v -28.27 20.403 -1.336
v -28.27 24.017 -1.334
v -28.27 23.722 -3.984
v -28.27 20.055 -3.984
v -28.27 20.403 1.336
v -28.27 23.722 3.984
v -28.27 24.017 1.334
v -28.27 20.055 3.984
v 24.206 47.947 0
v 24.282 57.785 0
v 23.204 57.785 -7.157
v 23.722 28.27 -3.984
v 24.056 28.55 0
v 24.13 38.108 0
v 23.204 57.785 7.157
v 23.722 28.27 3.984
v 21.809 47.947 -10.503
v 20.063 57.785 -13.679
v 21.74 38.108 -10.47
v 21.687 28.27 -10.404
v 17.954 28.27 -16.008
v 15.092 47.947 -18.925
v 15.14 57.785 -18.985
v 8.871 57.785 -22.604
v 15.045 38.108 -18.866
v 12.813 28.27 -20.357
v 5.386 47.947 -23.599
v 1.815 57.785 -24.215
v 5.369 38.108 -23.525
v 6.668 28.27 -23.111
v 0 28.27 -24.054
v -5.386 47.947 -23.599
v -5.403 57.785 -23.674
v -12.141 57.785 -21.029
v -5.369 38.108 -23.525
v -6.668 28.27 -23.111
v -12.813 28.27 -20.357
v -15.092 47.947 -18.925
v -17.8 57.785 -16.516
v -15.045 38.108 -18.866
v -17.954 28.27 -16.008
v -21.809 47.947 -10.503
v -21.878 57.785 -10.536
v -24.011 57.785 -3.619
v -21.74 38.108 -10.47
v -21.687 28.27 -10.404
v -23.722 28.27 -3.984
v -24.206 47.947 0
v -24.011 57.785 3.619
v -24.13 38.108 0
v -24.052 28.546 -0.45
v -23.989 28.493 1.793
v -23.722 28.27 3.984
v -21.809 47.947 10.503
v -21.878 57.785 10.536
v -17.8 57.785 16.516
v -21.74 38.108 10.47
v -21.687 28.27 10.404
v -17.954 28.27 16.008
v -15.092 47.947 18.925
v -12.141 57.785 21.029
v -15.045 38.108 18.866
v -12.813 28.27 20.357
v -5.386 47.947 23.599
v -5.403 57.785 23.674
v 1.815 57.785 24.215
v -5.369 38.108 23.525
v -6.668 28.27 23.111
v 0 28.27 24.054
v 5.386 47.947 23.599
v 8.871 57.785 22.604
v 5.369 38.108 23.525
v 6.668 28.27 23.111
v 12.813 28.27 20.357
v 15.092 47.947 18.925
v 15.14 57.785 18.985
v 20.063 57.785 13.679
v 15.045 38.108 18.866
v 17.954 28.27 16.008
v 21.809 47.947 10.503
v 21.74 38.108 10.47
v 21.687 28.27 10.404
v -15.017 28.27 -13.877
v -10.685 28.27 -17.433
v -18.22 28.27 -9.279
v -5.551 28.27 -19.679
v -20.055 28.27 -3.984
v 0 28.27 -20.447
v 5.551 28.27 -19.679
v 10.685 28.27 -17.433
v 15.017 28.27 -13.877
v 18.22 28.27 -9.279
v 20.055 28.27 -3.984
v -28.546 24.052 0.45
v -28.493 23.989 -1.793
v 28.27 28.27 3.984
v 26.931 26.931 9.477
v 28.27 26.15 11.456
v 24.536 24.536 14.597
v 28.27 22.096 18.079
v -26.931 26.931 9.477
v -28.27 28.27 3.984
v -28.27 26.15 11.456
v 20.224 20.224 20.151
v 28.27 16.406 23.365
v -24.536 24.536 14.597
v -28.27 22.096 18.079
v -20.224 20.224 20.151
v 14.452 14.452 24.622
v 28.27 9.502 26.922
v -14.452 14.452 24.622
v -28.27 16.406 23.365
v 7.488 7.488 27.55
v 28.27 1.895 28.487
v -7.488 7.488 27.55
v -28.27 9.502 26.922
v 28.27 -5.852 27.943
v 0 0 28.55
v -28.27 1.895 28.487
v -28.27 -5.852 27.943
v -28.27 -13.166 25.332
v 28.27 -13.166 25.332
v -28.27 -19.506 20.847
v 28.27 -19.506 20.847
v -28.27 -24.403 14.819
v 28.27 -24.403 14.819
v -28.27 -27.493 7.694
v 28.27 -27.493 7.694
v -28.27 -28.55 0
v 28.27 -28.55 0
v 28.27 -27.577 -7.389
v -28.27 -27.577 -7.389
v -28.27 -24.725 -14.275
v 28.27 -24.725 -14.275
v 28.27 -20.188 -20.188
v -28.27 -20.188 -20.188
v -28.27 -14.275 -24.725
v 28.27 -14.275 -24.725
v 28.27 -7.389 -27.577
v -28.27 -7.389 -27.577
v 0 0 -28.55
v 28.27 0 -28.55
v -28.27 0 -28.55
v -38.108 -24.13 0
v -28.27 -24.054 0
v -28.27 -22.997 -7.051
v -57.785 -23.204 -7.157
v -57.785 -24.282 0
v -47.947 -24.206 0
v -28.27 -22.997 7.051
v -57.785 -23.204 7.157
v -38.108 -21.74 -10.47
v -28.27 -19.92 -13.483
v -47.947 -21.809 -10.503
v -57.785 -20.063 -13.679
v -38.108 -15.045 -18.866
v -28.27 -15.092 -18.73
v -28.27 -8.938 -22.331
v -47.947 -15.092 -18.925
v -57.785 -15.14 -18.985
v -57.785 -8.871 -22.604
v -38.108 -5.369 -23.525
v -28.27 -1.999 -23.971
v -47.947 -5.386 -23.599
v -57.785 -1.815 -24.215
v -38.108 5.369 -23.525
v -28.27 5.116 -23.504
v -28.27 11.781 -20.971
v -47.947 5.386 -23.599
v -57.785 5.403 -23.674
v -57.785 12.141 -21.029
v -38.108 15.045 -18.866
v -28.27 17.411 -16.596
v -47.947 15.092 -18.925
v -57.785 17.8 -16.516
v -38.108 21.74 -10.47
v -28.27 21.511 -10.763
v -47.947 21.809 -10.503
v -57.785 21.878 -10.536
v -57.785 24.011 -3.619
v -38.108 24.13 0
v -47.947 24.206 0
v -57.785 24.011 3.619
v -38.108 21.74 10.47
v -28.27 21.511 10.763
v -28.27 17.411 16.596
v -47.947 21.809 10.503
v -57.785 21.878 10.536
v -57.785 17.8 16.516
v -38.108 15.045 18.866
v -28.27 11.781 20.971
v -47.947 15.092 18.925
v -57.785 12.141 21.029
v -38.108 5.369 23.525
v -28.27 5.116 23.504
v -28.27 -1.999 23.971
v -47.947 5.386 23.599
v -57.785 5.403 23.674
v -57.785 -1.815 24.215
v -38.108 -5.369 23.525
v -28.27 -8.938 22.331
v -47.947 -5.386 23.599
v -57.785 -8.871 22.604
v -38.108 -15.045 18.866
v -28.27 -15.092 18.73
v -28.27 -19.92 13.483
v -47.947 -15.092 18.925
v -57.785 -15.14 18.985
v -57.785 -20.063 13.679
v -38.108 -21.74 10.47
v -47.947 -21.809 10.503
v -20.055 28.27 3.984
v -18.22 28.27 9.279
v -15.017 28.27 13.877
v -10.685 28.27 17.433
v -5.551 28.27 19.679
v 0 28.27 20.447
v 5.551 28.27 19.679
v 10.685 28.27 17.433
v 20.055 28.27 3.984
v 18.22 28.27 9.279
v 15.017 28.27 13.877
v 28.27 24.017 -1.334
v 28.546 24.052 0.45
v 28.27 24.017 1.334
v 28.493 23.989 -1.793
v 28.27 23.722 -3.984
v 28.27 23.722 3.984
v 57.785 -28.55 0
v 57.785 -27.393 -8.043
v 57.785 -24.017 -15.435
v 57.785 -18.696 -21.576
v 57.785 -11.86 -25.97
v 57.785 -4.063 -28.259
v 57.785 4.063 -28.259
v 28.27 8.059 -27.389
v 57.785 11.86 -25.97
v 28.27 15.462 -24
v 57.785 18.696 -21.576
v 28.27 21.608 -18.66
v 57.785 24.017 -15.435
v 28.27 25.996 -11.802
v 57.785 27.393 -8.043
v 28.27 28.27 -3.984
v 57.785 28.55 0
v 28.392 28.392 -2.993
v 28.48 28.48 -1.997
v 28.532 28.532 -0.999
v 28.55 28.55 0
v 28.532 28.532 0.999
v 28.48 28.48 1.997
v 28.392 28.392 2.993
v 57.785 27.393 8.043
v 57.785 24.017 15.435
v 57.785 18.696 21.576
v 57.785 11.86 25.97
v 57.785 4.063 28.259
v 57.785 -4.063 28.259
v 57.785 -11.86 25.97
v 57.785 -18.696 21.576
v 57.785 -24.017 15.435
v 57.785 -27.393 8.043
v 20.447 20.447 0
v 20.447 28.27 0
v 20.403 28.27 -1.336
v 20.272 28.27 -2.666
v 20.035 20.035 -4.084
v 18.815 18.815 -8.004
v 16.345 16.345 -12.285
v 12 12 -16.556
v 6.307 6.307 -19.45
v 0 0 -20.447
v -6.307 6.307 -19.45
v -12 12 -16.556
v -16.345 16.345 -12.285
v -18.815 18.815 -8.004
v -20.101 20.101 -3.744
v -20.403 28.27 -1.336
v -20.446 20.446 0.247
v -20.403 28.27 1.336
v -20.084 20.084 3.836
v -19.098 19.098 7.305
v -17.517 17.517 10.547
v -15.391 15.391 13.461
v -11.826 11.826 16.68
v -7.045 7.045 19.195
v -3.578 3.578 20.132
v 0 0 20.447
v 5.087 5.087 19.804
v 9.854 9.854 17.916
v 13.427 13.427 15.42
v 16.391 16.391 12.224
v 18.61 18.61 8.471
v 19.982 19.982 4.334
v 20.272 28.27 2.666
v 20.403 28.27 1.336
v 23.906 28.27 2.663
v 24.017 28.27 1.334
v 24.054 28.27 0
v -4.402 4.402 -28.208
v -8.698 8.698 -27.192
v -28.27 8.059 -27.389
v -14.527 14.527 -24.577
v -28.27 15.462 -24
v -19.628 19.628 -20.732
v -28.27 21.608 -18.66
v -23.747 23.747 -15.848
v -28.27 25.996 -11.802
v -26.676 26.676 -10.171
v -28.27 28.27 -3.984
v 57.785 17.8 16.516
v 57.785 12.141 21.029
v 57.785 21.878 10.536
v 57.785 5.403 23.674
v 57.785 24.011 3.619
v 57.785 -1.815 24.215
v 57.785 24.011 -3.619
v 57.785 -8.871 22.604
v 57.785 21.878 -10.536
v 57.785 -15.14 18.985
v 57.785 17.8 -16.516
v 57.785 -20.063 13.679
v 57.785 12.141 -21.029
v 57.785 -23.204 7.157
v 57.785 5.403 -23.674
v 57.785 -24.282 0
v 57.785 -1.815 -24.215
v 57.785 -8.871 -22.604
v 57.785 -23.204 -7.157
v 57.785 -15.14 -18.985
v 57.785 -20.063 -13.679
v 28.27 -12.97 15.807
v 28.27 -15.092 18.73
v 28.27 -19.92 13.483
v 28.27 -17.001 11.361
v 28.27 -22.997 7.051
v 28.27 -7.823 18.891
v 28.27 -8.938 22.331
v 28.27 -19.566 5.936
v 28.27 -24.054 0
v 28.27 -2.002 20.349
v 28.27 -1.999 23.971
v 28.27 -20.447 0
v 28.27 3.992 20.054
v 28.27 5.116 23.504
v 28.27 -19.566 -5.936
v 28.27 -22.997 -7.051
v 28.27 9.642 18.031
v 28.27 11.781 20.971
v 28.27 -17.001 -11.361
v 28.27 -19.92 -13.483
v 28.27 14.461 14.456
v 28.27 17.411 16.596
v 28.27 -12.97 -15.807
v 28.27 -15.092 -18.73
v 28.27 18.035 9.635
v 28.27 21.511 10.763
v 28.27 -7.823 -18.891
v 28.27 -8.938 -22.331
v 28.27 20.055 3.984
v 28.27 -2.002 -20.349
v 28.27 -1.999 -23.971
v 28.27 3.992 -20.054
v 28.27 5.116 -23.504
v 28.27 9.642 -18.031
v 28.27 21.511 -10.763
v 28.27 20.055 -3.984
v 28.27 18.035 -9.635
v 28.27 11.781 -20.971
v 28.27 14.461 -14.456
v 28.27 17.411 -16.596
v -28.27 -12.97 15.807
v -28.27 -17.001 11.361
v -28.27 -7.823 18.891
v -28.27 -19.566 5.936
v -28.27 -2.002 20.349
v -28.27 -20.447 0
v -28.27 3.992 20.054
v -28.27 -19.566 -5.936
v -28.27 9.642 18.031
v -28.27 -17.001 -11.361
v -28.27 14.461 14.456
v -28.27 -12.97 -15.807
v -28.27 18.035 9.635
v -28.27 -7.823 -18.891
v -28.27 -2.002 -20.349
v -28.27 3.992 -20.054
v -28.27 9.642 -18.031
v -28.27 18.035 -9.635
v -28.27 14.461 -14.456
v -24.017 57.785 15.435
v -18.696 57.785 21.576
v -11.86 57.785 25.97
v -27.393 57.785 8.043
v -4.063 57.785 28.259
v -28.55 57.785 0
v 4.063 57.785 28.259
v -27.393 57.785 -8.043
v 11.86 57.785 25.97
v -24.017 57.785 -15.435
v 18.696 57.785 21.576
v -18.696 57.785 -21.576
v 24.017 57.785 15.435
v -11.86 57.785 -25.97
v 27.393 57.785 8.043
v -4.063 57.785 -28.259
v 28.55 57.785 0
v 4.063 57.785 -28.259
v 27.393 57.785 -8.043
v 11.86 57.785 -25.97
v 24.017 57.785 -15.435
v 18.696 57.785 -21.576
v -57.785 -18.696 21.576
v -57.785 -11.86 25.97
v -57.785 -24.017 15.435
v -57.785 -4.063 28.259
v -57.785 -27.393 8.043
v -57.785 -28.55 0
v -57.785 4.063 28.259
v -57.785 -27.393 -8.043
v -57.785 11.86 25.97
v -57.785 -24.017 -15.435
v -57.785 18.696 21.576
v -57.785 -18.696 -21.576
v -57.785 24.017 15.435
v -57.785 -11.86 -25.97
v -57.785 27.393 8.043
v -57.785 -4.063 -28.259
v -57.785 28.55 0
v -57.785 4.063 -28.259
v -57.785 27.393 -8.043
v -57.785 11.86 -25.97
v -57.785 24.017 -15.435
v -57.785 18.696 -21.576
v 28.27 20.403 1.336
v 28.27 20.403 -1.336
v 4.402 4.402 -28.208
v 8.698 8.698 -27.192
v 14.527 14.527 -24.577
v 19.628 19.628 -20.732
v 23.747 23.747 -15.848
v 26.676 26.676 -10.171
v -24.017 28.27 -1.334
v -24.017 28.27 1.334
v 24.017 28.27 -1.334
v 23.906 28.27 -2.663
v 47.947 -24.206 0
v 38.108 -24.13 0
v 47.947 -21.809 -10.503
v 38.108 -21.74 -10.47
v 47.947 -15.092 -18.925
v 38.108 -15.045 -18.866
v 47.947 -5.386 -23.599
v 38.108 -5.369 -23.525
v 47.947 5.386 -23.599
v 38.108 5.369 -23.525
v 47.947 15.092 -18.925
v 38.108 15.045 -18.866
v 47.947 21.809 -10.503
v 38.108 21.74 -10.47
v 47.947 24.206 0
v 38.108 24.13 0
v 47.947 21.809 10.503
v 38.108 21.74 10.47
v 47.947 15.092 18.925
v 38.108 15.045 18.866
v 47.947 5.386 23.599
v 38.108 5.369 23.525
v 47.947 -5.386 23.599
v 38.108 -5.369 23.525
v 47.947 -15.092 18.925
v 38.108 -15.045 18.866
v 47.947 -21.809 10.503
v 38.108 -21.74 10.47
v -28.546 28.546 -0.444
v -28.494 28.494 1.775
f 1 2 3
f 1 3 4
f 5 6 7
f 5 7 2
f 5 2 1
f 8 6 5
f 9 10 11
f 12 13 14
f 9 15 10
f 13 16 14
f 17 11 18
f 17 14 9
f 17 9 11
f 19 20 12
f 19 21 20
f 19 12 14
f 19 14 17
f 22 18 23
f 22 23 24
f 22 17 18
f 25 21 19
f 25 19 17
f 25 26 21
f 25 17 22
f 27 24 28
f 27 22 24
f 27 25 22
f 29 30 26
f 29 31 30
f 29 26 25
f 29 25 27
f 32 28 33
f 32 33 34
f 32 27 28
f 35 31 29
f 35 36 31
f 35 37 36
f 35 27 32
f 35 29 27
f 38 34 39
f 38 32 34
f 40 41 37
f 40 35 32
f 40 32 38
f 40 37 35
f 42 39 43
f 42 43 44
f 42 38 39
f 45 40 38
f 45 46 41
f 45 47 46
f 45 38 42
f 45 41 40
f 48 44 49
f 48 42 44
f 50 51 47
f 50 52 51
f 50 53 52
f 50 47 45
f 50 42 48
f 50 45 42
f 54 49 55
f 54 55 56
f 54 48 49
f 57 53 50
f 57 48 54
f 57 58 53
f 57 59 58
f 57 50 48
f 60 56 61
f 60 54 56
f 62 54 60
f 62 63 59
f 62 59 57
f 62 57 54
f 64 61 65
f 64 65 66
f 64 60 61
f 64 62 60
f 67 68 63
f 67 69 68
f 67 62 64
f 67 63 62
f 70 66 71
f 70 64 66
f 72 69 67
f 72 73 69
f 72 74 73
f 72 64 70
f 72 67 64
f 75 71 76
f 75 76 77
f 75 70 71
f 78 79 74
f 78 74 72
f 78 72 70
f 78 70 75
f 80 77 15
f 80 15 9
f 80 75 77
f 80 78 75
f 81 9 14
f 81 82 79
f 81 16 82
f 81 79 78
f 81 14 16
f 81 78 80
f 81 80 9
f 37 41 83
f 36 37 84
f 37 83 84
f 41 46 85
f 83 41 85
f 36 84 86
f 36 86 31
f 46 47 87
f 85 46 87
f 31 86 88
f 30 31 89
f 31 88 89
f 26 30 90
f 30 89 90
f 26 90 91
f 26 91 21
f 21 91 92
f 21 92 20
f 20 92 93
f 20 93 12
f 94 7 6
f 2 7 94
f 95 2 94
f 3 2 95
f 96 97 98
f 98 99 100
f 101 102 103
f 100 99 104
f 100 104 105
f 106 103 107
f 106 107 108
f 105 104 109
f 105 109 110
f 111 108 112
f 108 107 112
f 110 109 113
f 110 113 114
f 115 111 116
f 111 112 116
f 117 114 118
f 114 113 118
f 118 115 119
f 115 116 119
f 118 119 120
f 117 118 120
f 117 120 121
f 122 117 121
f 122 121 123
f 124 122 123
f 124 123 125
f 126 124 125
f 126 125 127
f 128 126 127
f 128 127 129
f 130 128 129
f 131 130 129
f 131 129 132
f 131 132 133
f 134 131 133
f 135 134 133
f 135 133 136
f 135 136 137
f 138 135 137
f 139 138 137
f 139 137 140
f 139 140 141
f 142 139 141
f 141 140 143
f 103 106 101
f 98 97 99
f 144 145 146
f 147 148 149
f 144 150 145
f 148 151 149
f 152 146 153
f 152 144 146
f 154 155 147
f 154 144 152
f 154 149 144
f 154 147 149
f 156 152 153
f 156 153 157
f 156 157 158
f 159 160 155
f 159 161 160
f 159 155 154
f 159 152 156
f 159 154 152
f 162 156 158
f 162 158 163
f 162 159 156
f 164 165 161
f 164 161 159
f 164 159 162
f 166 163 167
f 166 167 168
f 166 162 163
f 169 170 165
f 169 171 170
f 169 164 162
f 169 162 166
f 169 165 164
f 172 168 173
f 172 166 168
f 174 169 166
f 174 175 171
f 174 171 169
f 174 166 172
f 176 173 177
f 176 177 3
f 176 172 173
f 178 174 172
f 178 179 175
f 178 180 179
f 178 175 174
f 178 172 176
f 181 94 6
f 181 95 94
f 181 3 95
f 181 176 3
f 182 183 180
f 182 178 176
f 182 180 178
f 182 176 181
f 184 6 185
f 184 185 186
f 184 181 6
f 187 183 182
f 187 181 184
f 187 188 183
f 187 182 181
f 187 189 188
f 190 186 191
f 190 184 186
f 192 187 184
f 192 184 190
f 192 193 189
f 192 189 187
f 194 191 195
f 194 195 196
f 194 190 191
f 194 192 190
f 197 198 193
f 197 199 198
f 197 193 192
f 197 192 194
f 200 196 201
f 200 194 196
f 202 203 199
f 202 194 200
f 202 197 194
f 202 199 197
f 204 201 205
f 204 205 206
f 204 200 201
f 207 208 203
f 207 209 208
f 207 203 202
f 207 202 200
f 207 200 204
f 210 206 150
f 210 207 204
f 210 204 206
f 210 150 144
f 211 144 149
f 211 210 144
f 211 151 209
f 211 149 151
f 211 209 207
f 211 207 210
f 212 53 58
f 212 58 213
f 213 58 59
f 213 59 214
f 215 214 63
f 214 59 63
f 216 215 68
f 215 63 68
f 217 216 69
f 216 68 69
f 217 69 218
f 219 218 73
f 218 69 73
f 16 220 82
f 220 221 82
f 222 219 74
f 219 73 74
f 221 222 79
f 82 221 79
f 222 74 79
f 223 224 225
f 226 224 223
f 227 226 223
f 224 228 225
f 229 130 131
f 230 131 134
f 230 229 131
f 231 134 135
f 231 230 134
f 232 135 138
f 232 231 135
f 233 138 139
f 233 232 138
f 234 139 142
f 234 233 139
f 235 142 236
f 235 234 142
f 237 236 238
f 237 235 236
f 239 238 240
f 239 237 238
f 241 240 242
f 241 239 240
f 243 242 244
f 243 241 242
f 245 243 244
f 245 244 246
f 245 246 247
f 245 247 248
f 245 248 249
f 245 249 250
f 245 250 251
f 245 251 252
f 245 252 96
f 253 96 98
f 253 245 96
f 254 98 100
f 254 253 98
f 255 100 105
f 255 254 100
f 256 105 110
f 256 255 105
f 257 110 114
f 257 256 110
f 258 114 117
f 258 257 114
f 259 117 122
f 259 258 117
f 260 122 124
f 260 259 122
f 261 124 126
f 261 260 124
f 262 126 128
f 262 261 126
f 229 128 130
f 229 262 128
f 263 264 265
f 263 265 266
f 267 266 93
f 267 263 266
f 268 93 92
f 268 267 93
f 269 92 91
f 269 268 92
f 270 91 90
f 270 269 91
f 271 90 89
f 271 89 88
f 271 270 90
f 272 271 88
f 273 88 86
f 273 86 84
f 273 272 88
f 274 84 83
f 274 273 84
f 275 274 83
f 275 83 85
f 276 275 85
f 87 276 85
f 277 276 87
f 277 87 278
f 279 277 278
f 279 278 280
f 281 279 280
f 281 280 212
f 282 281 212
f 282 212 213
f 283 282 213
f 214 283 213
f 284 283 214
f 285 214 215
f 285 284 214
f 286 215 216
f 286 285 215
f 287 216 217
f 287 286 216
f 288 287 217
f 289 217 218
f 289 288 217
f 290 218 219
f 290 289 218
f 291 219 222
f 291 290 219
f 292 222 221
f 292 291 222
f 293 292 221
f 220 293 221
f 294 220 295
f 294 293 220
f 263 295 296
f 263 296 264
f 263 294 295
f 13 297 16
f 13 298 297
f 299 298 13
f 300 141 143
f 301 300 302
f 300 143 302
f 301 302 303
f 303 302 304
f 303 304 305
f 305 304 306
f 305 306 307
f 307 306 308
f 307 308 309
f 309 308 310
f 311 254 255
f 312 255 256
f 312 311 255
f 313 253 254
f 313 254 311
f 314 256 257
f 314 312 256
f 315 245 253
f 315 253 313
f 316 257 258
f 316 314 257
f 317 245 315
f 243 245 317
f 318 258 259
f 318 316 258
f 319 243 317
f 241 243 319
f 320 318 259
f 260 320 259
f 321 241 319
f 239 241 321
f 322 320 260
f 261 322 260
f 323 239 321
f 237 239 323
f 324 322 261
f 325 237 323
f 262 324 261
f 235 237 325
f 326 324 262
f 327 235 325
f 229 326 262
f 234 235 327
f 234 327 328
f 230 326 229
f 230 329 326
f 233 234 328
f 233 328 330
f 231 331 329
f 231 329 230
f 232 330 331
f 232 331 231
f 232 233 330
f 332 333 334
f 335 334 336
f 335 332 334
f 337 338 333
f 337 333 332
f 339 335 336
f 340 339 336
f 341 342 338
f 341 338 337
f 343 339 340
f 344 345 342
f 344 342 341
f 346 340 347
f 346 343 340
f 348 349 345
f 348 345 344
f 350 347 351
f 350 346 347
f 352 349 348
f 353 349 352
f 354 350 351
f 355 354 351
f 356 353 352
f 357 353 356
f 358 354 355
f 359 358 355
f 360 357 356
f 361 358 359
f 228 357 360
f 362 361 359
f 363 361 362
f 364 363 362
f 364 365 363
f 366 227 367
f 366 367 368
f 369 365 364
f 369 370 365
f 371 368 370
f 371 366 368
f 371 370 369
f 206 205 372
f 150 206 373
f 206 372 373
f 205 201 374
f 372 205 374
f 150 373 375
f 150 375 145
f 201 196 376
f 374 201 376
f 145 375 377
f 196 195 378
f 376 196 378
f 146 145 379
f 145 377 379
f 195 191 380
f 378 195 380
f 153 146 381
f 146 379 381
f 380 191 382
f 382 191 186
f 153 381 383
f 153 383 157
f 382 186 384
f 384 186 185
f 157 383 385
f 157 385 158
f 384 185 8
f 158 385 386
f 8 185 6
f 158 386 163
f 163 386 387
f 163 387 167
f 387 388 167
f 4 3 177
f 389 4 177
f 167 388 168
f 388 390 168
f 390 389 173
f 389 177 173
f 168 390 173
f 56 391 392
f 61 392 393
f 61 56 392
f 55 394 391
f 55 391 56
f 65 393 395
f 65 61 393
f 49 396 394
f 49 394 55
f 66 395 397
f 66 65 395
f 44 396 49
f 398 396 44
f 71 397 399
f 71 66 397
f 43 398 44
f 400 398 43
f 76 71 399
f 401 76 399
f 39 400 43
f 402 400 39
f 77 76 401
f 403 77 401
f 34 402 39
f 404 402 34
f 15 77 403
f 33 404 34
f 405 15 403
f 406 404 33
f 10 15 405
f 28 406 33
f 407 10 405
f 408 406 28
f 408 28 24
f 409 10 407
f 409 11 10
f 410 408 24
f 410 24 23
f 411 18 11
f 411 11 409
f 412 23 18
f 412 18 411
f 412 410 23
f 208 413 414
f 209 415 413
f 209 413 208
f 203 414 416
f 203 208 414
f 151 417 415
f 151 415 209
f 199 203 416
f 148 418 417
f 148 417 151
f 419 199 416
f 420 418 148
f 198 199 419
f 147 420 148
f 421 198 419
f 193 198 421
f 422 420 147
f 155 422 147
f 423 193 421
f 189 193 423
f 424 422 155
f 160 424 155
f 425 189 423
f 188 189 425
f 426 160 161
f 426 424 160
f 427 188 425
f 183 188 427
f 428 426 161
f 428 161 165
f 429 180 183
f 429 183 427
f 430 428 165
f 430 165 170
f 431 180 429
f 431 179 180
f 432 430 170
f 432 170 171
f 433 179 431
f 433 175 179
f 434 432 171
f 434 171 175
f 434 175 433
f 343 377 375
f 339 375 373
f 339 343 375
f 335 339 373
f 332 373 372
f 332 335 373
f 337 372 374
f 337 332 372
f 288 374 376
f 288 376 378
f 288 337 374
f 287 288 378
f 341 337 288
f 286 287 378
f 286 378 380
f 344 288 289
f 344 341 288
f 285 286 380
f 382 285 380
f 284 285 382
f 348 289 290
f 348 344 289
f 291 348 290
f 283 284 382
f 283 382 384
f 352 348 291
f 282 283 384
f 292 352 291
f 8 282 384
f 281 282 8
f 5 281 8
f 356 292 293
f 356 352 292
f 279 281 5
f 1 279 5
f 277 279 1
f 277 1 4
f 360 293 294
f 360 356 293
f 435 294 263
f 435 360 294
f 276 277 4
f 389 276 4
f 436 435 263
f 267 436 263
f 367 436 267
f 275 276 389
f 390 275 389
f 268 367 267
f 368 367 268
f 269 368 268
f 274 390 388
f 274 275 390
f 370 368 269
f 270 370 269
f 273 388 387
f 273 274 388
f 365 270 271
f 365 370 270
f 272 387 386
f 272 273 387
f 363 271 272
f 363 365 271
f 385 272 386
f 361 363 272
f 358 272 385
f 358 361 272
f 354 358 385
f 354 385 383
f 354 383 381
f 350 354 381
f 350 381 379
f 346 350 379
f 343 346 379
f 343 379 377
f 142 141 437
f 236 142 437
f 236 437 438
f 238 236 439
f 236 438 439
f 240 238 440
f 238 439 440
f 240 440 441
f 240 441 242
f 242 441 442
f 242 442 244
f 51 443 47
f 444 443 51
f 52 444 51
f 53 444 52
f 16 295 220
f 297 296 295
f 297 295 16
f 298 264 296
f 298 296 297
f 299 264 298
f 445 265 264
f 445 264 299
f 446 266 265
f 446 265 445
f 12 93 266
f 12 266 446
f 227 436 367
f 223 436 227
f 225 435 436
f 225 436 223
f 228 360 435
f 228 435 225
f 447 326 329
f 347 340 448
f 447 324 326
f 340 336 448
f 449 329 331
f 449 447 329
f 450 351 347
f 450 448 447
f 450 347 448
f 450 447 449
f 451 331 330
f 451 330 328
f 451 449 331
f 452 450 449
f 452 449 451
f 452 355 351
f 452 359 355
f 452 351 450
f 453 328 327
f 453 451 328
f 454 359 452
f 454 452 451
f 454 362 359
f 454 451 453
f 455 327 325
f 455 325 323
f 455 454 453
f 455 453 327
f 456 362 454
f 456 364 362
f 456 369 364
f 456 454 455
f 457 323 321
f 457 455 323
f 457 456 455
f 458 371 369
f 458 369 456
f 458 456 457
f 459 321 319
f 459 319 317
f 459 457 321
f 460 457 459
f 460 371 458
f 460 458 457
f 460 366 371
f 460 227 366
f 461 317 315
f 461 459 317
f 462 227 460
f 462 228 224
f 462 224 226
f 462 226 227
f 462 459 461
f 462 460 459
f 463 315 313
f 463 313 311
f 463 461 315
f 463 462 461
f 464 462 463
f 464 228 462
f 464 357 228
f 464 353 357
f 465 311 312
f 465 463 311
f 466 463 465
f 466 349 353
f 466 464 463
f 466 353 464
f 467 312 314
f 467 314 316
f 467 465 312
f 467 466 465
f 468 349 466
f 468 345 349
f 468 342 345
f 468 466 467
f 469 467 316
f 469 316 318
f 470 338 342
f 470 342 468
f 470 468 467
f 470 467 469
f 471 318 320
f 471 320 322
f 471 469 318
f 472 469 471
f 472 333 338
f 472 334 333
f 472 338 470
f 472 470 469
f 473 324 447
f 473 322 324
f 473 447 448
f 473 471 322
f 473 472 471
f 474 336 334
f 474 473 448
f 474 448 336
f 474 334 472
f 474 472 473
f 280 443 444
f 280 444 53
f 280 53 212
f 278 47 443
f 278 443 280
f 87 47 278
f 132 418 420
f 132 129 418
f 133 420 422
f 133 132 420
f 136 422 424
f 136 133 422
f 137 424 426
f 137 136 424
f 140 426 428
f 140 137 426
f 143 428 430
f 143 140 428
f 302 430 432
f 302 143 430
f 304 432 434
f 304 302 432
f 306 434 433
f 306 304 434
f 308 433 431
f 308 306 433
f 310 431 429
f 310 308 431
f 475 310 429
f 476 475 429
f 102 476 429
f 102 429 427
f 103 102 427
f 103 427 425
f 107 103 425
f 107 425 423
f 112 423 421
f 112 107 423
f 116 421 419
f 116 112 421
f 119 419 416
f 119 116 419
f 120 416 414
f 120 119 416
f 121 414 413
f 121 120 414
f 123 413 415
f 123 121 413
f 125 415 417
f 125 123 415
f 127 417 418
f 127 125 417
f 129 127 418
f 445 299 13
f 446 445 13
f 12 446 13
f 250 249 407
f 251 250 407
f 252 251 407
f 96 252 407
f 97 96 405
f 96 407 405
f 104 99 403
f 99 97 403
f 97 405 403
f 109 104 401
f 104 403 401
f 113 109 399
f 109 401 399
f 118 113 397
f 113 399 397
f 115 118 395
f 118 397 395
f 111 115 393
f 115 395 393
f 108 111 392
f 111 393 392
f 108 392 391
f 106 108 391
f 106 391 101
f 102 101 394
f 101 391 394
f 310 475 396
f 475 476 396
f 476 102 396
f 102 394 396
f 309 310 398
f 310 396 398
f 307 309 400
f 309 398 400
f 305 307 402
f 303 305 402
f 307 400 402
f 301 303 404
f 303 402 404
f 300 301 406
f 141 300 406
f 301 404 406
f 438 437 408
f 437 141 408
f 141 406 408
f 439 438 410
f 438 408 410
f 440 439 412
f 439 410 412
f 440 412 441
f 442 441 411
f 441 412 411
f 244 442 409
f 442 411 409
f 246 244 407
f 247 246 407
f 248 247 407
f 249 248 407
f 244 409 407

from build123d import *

# Parameters (mm, degrees)
SKETCH3_R           = 28.5496
BOSS_EXTRUDE1_DEPTH = 56.5404
SKETCH4_R           = 28.5496
BOSS_EXTRUDE2_DEPTH = 28.2702


with BuildPart() as part:
    # Sketch1 → Revolve1 (revolve)
    with BuildSketch(Plane.XY):
        Polygon((-57.785, -28.5496), (-28.2702, -28.5496), (-28.2702, -24.0538), (-57.785, -24.2824), align=None)
        Polygon((57.785, -24.2824), (28.2702, -24.0538), (28.2702, -28.5496), (57.785, -28.5496), align=None)
    revolve(axis=Axis((-57.785, 0, 0), (1, 0, 0)))



with BuildPart() as body_2:
    # Sketch2 → Revolve2 (revolve)
    with BuildSketch(Plane.XY):
        Polygon((24.2824, 57.785), (24.0538, 28.2702), (28.5496, 28.2702), (28.5496, 57.785), align=None)
    revolve(axis=Axis((0, 0, 0), (0, 1, 0)))


with BuildPart() as part_1:
    add(part.part)

    add(body_2.part)  # Boss-Extrude1 merges body 2
    # Sketch3 → Boss-Extrude1 (add)
    with BuildSketch(Plane(origin=(-28.2702, 0, 0), x_dir=(0, 0, -1), z_dir=(1, 0, 0))):
        Circle(SKETCH3_R)
    extrude(amount=BOSS_EXTRUDE1_DEPTH)

    # Sketch4 → Boss-Extrude2 (add)
    with BuildSketch(Plane.XZ.offset(-28.2702)):
        Circle(SKETCH4_R)
    extrude(amount=BOSS_EXTRUDE2_DEPTH)

    # Sketch5 → Cut-Revolve1 (revolve, cut)
    with BuildSketch(Plane.XY):
        Polygon((-57.785, -24.2824), (-28.2702, -24.0538), (-28.2702, -20.447), (28.2702, -20.447), (28.2702, -24.0538), (57.785, -24.2824), (57.785, 0), (-57.785, 0), align=None)
    revolve(axis=Axis((57.785, 0, 0), (-1, 0, 0)), mode=Mode.SUBTRACT)

    # Sketch6 → Cut-Revolve2 (revolve, cut)
    with BuildSketch(Plane.XY):
        Polygon((24.2824, 57.785), (24.0538, 28.2702), (20.447, 28.2702), (20.447, 0), (0, 0), (0, 57.785), align=None)
    revolve(axis=Axis((0, 0, 0), (0, 1, 0)), mode=Mode.SUBTRACT)


solid = part_1.part
